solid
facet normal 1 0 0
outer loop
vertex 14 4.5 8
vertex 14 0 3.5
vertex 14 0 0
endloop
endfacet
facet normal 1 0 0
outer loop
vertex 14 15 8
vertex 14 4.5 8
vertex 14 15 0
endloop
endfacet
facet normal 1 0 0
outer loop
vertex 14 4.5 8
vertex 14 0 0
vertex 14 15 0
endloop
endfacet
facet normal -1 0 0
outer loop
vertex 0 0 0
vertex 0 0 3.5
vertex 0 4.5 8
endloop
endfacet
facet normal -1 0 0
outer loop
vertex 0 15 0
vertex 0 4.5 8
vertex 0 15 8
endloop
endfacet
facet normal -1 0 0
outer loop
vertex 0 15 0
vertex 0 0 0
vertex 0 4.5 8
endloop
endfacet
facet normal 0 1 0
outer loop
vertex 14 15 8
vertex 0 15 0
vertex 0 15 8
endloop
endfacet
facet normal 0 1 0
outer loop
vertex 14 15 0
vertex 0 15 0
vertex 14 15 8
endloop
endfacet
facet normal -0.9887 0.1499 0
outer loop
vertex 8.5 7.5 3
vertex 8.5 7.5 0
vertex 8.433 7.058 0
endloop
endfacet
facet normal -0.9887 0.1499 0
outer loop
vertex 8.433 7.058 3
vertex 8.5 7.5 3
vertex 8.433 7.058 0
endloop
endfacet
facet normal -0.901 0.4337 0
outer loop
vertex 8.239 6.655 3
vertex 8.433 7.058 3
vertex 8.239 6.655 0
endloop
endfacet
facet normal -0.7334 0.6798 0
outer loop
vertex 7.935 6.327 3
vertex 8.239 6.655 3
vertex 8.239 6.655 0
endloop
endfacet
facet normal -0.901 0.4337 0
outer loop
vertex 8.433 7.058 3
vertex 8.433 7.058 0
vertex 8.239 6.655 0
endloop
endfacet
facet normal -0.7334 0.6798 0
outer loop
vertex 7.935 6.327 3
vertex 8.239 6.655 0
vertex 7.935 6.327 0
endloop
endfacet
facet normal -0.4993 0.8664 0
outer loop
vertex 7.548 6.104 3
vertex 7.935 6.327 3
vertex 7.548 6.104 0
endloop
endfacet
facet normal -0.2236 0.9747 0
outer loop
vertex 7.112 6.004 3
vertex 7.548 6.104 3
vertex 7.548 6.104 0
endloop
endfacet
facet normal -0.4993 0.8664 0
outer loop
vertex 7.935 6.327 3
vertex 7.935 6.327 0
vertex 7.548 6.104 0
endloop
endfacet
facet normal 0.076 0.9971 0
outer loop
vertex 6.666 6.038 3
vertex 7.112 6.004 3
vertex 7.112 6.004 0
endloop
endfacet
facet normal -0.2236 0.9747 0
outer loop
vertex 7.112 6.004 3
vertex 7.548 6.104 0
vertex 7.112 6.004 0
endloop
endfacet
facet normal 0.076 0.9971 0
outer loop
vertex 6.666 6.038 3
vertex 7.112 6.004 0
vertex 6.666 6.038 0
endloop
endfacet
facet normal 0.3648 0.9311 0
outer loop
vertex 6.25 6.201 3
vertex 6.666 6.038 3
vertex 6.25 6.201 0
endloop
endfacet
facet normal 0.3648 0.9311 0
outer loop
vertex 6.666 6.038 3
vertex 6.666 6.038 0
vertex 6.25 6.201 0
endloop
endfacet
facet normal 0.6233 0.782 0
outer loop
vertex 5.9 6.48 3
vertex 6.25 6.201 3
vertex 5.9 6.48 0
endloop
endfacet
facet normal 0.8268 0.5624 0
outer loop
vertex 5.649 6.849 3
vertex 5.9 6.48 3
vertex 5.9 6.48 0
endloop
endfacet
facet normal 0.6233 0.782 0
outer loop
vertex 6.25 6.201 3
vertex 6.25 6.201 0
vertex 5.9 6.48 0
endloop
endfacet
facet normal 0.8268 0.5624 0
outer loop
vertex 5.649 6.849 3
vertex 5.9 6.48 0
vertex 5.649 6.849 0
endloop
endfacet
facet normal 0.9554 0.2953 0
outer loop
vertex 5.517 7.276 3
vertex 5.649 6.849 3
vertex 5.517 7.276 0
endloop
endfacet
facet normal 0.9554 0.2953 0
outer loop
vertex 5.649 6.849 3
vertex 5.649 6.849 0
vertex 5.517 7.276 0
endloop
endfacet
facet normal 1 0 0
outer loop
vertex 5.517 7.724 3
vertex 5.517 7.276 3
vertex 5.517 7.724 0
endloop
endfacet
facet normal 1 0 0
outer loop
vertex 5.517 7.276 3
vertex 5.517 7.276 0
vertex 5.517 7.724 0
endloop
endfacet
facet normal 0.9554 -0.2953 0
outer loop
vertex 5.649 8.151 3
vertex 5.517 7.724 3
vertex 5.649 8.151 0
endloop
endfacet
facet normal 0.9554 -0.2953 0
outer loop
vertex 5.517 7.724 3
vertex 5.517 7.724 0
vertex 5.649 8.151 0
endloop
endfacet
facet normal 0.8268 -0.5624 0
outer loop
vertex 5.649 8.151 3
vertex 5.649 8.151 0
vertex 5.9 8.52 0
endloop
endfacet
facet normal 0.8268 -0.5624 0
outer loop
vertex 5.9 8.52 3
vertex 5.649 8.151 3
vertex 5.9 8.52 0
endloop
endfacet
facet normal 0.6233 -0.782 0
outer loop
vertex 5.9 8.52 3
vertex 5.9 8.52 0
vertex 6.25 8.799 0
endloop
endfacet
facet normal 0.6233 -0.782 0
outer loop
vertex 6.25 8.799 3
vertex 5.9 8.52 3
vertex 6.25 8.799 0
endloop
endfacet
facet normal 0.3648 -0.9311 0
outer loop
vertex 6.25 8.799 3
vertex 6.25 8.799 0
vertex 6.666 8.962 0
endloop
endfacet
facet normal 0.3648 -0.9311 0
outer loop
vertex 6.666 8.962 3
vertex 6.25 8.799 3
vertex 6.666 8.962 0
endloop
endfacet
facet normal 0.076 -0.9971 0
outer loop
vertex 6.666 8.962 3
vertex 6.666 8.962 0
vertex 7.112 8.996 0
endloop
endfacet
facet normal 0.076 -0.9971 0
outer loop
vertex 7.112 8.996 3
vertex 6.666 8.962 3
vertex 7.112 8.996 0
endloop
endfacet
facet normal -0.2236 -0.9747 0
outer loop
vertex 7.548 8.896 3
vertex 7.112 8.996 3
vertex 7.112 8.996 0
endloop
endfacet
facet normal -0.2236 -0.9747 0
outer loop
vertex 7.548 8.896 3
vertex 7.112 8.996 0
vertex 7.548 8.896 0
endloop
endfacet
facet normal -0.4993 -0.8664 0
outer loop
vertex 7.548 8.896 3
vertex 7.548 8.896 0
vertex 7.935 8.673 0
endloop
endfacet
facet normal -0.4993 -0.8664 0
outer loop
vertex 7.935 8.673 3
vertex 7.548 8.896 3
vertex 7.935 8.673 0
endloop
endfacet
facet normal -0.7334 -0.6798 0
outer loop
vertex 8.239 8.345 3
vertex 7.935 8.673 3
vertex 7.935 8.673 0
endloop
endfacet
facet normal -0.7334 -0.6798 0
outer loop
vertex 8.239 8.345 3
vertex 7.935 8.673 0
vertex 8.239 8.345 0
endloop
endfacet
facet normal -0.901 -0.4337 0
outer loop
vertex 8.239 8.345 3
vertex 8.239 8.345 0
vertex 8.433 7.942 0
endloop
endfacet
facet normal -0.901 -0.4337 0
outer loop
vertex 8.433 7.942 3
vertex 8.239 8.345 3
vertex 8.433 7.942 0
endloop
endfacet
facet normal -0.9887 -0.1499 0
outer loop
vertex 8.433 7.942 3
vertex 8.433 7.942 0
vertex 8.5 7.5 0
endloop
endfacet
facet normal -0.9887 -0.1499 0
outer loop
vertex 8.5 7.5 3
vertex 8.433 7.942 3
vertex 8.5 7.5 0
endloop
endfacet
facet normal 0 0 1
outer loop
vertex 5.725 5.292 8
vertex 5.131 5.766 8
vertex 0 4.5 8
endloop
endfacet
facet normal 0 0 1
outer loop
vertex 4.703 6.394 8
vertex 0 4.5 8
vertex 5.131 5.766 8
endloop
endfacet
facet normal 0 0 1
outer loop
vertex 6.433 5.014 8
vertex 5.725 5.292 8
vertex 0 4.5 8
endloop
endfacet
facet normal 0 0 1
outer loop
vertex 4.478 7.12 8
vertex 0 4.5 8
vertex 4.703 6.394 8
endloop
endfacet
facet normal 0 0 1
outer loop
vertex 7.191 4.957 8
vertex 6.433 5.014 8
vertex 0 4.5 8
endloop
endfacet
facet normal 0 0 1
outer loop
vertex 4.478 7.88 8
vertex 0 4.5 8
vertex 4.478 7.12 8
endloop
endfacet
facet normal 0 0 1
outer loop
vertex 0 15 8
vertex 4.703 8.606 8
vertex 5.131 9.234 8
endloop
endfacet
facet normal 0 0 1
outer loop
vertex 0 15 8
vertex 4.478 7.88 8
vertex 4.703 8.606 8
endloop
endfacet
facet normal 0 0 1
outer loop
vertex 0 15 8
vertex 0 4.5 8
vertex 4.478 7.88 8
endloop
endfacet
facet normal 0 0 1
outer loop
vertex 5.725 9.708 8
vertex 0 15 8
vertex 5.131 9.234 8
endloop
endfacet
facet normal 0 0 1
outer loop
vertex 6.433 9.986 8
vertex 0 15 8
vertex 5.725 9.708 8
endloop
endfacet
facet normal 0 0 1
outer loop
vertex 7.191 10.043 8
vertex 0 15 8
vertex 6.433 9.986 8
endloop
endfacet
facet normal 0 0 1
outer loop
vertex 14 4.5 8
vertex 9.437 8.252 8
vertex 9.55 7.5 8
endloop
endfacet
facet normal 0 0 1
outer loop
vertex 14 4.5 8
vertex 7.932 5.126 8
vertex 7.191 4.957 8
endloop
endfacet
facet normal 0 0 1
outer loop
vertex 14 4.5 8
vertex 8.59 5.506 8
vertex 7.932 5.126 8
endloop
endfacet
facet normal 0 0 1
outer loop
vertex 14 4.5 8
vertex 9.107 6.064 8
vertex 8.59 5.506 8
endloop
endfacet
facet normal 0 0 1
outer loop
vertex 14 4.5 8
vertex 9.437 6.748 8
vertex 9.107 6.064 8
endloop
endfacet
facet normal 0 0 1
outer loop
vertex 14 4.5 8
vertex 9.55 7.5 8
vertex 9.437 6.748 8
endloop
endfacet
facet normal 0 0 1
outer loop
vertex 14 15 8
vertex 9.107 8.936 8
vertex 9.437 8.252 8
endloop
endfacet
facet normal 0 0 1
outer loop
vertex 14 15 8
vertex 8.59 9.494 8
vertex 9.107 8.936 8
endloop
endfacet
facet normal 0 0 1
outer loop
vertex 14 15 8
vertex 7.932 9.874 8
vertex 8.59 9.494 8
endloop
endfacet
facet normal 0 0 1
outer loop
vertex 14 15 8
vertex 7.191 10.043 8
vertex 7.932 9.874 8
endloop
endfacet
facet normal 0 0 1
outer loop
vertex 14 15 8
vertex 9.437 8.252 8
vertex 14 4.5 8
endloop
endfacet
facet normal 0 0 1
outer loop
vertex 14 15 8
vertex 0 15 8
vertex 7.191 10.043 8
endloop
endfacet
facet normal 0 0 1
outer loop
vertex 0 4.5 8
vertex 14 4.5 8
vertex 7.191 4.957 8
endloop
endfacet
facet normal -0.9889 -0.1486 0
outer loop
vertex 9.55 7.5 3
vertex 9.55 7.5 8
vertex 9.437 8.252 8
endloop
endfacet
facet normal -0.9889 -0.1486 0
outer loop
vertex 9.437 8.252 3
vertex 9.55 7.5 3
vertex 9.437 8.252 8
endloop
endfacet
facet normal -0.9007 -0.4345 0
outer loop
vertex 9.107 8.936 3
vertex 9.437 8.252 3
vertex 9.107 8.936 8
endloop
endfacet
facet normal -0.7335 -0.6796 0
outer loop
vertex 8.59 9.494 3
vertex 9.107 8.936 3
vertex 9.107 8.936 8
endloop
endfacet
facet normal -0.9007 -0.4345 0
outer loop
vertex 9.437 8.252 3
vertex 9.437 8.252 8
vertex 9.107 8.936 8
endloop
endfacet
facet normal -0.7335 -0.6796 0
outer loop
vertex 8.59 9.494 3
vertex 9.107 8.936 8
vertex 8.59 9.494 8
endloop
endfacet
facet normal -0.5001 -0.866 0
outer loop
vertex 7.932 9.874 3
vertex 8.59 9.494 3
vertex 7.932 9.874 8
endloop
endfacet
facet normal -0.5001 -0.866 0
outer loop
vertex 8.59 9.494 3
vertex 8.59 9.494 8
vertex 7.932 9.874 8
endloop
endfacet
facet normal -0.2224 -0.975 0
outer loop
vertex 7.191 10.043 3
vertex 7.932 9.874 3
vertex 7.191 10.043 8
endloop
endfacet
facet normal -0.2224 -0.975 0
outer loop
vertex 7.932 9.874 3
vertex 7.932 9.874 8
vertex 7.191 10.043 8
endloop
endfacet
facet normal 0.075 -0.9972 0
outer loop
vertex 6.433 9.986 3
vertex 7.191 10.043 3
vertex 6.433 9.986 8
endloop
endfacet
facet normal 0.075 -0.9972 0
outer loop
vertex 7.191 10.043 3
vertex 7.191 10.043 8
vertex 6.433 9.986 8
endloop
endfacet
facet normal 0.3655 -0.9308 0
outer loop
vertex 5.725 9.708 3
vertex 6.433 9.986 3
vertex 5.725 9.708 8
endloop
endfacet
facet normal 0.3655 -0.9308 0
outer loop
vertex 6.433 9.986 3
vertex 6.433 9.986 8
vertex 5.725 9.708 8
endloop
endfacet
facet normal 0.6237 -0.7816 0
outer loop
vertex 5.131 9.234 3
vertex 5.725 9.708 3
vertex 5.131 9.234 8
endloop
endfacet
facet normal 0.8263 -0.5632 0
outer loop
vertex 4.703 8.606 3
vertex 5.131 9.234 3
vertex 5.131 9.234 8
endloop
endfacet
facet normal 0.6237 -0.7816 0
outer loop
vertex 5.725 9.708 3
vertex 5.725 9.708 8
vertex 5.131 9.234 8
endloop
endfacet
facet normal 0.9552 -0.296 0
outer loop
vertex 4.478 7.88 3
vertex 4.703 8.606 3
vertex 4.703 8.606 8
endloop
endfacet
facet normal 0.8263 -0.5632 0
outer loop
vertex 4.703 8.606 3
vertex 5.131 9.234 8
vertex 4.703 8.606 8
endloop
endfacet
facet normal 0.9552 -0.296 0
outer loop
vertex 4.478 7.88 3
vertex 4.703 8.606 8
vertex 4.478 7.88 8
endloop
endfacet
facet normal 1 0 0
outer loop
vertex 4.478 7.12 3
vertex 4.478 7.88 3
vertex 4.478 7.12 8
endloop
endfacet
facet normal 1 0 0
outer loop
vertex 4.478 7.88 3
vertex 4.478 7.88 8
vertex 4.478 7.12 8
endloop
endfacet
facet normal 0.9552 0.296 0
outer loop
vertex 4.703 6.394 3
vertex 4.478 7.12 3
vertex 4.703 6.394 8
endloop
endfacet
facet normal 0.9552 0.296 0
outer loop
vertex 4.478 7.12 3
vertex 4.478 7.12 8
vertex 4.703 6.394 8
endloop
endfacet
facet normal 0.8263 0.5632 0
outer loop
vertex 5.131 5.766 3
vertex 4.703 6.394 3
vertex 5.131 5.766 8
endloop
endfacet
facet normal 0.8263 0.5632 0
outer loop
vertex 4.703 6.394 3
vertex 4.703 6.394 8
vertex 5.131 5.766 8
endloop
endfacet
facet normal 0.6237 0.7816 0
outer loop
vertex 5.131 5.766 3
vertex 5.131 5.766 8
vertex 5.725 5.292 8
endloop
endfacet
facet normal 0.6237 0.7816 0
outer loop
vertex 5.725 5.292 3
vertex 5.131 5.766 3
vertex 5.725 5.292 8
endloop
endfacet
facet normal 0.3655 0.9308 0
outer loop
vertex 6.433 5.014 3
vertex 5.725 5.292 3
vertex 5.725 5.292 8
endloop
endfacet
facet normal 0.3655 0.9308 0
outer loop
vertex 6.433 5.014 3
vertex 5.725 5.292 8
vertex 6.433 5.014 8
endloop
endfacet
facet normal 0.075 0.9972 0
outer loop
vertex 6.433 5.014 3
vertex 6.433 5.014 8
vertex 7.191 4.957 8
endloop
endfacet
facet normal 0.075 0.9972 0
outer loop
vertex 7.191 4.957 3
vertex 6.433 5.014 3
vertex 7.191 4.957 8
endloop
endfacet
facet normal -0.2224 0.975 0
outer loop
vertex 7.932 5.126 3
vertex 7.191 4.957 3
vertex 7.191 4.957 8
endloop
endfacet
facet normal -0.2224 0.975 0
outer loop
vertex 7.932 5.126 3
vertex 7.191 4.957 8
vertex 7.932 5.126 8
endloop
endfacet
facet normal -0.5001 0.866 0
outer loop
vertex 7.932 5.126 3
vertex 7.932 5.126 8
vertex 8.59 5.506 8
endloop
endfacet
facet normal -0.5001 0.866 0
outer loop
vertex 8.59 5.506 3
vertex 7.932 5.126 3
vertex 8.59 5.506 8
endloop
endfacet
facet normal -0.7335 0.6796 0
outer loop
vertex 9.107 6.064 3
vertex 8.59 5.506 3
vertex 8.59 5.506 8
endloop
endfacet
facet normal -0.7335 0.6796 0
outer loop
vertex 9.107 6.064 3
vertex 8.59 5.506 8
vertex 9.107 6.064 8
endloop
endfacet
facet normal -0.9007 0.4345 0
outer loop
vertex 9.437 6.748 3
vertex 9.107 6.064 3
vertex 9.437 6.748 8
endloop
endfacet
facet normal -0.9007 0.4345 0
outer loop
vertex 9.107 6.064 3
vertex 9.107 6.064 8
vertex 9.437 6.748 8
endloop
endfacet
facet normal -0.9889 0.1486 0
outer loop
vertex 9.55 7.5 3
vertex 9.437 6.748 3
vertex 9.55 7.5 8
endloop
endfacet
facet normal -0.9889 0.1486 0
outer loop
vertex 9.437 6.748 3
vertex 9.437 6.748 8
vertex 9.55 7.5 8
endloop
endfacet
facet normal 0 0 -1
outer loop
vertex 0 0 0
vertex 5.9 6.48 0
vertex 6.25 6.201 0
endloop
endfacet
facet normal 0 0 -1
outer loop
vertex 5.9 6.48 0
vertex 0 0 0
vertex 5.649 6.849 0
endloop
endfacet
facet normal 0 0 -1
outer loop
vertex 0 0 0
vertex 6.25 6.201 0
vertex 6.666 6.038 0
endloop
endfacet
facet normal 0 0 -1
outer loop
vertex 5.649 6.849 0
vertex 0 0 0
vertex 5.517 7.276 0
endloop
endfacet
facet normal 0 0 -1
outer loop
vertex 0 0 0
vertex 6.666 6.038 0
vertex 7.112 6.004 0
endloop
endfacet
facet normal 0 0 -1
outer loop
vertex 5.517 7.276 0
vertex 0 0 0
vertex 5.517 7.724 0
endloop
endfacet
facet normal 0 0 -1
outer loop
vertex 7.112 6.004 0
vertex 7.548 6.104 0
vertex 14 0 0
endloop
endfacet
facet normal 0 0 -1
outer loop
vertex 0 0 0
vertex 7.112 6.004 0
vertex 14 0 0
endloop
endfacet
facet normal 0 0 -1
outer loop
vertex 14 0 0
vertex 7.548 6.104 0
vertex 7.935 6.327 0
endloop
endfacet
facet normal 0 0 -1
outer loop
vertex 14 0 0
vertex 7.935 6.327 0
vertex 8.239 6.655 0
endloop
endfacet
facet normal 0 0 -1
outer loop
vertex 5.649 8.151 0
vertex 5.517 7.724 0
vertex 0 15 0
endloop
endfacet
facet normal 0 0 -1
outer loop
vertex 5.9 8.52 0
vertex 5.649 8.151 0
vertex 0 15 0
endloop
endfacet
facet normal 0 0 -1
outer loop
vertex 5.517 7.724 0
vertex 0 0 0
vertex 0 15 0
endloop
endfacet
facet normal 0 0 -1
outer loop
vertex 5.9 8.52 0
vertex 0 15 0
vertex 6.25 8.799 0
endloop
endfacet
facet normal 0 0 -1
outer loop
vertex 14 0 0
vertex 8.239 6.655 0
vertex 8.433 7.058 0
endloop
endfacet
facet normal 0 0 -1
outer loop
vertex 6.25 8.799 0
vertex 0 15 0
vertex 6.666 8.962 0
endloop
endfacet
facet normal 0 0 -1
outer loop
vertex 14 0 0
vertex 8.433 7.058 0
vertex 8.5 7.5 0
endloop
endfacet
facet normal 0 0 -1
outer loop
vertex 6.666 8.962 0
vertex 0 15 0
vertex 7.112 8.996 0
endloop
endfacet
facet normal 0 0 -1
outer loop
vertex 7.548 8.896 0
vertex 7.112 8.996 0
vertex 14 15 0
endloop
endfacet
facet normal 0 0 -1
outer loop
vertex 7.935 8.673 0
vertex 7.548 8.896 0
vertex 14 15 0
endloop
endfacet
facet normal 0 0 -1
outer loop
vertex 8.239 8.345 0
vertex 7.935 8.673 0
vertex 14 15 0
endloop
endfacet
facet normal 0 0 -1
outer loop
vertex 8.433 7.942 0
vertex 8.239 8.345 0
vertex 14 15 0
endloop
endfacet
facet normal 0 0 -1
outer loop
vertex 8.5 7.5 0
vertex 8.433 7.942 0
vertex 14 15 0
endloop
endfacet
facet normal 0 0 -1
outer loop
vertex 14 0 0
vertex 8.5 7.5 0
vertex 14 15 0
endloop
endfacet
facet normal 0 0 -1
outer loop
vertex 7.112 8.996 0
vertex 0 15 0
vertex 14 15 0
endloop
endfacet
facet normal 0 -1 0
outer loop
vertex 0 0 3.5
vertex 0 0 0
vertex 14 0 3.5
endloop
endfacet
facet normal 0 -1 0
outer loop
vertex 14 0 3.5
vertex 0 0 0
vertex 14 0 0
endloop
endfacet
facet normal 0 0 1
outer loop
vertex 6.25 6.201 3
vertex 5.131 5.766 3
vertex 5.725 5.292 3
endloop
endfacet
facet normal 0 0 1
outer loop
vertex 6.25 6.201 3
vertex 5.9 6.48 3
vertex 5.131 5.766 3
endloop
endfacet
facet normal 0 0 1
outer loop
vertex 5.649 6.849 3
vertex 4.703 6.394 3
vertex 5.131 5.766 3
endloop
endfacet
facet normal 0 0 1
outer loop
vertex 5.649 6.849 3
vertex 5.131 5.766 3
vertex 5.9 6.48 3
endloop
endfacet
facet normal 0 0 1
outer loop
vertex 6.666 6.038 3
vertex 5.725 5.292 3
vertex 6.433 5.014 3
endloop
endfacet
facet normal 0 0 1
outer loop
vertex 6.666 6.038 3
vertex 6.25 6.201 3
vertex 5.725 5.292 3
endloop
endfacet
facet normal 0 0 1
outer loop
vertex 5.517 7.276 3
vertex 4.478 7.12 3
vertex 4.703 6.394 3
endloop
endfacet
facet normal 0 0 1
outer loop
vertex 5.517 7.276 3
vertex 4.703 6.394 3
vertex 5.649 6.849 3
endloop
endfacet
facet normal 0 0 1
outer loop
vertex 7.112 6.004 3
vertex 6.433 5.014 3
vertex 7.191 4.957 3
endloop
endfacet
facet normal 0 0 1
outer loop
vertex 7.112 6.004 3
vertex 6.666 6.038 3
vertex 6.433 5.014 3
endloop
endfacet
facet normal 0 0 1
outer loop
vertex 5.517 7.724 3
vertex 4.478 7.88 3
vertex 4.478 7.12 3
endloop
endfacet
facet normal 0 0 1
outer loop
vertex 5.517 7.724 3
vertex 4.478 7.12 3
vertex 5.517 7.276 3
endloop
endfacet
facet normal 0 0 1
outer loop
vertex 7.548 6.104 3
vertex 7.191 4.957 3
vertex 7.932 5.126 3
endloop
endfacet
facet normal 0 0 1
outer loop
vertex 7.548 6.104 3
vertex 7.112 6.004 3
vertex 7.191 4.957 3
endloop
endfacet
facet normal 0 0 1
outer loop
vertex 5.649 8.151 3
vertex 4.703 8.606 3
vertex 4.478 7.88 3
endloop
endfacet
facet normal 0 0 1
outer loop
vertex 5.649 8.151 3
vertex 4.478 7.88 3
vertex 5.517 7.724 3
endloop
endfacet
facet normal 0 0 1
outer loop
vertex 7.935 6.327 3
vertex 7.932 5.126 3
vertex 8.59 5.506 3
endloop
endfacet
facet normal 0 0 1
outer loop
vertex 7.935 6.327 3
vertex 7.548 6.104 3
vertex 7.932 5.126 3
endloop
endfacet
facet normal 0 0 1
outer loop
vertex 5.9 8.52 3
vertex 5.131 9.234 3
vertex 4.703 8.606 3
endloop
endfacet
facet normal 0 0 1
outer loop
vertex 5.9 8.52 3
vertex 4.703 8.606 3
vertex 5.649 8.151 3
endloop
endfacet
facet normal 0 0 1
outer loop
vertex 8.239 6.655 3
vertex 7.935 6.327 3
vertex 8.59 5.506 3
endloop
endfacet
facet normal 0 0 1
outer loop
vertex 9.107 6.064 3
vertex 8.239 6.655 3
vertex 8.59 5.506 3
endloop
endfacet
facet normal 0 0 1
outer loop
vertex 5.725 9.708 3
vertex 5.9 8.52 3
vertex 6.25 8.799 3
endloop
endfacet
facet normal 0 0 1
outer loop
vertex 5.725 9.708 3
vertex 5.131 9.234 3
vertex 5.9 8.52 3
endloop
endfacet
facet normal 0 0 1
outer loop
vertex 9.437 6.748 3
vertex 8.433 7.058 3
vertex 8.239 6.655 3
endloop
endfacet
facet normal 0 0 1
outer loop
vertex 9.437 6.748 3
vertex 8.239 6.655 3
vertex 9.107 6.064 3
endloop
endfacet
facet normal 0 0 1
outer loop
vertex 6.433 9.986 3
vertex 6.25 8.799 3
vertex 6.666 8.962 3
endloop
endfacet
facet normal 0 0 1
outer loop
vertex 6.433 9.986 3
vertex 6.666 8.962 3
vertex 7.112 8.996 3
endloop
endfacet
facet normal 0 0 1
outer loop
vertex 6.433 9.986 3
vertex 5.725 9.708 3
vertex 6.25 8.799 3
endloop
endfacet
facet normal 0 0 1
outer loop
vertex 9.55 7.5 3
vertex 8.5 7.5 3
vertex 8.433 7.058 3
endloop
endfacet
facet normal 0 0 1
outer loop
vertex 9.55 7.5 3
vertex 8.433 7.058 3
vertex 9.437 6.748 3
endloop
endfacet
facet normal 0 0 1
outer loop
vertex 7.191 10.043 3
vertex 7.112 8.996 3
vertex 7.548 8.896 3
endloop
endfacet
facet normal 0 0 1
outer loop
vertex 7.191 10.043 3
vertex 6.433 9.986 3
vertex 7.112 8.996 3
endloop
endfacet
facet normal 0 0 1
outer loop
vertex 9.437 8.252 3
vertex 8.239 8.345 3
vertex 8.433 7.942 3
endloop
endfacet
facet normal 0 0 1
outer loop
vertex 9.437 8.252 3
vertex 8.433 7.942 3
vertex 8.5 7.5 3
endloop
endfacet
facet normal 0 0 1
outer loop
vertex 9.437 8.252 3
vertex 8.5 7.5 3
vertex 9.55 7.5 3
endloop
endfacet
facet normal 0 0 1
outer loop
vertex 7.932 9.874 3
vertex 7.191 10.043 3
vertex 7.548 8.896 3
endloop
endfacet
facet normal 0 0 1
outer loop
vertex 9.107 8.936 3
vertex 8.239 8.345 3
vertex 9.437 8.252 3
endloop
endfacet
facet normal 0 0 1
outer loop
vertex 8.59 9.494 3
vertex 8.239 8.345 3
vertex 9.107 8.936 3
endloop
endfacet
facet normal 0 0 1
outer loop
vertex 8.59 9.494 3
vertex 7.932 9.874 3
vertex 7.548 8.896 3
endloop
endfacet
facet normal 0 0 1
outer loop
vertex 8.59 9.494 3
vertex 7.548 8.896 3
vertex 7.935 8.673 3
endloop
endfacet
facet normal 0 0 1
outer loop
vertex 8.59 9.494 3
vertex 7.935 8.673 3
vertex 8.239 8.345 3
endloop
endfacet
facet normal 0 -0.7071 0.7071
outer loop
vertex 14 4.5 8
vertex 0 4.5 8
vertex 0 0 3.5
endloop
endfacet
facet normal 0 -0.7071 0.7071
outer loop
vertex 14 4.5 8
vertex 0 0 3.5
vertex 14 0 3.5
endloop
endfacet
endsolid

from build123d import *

# Parameters (mm, degrees)
SKETCH_W        = 14
SKETCH_H        = 15
PAD_DEPTH       = 8
SKETCH001_R     = 1.5
POCKET_DEPTH    = 8.001
SKETCH002_R     = 2.55
POCKET001_DEPTH = 5
CHAMFER_SIZE    = 4.5


with BuildPart() as part:
    # Sketch → Pad (new body)
    with BuildSketch(Plane.XY):
        with Locations((7, 7.5)):
            Rectangle(SKETCH_W, SKETCH_H)
    extrude(amount=PAD_DEPTH)

    # Sketch001 (on Face5 of Pad) → Pocket (cut, through all)
    with BuildSketch(Plane(origin=(0, 0, 0), x_dir=(1, 0, 0), z_dir=(0, 0, -1))):
        with Locations((7, -7.5)):
            Circle(SKETCH001_R)
    extrude(amount=-POCKET_DEPTH, mode=Mode.SUBTRACT)

    # Sketch002 (on Face5 of Pocket) → Pocket001 (cut)
    with BuildSketch(Plane.XY.offset(8)):
        with Locations((7, 7.5)):
            Circle(SKETCH002_R)
    extrude(amount=-POCKET001_DEPTH, mode=Mode.SUBTRACT)

    # Chamfer
    chamfer_edges = [part.edges().sort_by_distance(p)[0] for p in [
        (7, 0, 8),
    ]]
    chamfer(chamfer_edges, length=CHAMFER_SIZE)


solid = part.part
